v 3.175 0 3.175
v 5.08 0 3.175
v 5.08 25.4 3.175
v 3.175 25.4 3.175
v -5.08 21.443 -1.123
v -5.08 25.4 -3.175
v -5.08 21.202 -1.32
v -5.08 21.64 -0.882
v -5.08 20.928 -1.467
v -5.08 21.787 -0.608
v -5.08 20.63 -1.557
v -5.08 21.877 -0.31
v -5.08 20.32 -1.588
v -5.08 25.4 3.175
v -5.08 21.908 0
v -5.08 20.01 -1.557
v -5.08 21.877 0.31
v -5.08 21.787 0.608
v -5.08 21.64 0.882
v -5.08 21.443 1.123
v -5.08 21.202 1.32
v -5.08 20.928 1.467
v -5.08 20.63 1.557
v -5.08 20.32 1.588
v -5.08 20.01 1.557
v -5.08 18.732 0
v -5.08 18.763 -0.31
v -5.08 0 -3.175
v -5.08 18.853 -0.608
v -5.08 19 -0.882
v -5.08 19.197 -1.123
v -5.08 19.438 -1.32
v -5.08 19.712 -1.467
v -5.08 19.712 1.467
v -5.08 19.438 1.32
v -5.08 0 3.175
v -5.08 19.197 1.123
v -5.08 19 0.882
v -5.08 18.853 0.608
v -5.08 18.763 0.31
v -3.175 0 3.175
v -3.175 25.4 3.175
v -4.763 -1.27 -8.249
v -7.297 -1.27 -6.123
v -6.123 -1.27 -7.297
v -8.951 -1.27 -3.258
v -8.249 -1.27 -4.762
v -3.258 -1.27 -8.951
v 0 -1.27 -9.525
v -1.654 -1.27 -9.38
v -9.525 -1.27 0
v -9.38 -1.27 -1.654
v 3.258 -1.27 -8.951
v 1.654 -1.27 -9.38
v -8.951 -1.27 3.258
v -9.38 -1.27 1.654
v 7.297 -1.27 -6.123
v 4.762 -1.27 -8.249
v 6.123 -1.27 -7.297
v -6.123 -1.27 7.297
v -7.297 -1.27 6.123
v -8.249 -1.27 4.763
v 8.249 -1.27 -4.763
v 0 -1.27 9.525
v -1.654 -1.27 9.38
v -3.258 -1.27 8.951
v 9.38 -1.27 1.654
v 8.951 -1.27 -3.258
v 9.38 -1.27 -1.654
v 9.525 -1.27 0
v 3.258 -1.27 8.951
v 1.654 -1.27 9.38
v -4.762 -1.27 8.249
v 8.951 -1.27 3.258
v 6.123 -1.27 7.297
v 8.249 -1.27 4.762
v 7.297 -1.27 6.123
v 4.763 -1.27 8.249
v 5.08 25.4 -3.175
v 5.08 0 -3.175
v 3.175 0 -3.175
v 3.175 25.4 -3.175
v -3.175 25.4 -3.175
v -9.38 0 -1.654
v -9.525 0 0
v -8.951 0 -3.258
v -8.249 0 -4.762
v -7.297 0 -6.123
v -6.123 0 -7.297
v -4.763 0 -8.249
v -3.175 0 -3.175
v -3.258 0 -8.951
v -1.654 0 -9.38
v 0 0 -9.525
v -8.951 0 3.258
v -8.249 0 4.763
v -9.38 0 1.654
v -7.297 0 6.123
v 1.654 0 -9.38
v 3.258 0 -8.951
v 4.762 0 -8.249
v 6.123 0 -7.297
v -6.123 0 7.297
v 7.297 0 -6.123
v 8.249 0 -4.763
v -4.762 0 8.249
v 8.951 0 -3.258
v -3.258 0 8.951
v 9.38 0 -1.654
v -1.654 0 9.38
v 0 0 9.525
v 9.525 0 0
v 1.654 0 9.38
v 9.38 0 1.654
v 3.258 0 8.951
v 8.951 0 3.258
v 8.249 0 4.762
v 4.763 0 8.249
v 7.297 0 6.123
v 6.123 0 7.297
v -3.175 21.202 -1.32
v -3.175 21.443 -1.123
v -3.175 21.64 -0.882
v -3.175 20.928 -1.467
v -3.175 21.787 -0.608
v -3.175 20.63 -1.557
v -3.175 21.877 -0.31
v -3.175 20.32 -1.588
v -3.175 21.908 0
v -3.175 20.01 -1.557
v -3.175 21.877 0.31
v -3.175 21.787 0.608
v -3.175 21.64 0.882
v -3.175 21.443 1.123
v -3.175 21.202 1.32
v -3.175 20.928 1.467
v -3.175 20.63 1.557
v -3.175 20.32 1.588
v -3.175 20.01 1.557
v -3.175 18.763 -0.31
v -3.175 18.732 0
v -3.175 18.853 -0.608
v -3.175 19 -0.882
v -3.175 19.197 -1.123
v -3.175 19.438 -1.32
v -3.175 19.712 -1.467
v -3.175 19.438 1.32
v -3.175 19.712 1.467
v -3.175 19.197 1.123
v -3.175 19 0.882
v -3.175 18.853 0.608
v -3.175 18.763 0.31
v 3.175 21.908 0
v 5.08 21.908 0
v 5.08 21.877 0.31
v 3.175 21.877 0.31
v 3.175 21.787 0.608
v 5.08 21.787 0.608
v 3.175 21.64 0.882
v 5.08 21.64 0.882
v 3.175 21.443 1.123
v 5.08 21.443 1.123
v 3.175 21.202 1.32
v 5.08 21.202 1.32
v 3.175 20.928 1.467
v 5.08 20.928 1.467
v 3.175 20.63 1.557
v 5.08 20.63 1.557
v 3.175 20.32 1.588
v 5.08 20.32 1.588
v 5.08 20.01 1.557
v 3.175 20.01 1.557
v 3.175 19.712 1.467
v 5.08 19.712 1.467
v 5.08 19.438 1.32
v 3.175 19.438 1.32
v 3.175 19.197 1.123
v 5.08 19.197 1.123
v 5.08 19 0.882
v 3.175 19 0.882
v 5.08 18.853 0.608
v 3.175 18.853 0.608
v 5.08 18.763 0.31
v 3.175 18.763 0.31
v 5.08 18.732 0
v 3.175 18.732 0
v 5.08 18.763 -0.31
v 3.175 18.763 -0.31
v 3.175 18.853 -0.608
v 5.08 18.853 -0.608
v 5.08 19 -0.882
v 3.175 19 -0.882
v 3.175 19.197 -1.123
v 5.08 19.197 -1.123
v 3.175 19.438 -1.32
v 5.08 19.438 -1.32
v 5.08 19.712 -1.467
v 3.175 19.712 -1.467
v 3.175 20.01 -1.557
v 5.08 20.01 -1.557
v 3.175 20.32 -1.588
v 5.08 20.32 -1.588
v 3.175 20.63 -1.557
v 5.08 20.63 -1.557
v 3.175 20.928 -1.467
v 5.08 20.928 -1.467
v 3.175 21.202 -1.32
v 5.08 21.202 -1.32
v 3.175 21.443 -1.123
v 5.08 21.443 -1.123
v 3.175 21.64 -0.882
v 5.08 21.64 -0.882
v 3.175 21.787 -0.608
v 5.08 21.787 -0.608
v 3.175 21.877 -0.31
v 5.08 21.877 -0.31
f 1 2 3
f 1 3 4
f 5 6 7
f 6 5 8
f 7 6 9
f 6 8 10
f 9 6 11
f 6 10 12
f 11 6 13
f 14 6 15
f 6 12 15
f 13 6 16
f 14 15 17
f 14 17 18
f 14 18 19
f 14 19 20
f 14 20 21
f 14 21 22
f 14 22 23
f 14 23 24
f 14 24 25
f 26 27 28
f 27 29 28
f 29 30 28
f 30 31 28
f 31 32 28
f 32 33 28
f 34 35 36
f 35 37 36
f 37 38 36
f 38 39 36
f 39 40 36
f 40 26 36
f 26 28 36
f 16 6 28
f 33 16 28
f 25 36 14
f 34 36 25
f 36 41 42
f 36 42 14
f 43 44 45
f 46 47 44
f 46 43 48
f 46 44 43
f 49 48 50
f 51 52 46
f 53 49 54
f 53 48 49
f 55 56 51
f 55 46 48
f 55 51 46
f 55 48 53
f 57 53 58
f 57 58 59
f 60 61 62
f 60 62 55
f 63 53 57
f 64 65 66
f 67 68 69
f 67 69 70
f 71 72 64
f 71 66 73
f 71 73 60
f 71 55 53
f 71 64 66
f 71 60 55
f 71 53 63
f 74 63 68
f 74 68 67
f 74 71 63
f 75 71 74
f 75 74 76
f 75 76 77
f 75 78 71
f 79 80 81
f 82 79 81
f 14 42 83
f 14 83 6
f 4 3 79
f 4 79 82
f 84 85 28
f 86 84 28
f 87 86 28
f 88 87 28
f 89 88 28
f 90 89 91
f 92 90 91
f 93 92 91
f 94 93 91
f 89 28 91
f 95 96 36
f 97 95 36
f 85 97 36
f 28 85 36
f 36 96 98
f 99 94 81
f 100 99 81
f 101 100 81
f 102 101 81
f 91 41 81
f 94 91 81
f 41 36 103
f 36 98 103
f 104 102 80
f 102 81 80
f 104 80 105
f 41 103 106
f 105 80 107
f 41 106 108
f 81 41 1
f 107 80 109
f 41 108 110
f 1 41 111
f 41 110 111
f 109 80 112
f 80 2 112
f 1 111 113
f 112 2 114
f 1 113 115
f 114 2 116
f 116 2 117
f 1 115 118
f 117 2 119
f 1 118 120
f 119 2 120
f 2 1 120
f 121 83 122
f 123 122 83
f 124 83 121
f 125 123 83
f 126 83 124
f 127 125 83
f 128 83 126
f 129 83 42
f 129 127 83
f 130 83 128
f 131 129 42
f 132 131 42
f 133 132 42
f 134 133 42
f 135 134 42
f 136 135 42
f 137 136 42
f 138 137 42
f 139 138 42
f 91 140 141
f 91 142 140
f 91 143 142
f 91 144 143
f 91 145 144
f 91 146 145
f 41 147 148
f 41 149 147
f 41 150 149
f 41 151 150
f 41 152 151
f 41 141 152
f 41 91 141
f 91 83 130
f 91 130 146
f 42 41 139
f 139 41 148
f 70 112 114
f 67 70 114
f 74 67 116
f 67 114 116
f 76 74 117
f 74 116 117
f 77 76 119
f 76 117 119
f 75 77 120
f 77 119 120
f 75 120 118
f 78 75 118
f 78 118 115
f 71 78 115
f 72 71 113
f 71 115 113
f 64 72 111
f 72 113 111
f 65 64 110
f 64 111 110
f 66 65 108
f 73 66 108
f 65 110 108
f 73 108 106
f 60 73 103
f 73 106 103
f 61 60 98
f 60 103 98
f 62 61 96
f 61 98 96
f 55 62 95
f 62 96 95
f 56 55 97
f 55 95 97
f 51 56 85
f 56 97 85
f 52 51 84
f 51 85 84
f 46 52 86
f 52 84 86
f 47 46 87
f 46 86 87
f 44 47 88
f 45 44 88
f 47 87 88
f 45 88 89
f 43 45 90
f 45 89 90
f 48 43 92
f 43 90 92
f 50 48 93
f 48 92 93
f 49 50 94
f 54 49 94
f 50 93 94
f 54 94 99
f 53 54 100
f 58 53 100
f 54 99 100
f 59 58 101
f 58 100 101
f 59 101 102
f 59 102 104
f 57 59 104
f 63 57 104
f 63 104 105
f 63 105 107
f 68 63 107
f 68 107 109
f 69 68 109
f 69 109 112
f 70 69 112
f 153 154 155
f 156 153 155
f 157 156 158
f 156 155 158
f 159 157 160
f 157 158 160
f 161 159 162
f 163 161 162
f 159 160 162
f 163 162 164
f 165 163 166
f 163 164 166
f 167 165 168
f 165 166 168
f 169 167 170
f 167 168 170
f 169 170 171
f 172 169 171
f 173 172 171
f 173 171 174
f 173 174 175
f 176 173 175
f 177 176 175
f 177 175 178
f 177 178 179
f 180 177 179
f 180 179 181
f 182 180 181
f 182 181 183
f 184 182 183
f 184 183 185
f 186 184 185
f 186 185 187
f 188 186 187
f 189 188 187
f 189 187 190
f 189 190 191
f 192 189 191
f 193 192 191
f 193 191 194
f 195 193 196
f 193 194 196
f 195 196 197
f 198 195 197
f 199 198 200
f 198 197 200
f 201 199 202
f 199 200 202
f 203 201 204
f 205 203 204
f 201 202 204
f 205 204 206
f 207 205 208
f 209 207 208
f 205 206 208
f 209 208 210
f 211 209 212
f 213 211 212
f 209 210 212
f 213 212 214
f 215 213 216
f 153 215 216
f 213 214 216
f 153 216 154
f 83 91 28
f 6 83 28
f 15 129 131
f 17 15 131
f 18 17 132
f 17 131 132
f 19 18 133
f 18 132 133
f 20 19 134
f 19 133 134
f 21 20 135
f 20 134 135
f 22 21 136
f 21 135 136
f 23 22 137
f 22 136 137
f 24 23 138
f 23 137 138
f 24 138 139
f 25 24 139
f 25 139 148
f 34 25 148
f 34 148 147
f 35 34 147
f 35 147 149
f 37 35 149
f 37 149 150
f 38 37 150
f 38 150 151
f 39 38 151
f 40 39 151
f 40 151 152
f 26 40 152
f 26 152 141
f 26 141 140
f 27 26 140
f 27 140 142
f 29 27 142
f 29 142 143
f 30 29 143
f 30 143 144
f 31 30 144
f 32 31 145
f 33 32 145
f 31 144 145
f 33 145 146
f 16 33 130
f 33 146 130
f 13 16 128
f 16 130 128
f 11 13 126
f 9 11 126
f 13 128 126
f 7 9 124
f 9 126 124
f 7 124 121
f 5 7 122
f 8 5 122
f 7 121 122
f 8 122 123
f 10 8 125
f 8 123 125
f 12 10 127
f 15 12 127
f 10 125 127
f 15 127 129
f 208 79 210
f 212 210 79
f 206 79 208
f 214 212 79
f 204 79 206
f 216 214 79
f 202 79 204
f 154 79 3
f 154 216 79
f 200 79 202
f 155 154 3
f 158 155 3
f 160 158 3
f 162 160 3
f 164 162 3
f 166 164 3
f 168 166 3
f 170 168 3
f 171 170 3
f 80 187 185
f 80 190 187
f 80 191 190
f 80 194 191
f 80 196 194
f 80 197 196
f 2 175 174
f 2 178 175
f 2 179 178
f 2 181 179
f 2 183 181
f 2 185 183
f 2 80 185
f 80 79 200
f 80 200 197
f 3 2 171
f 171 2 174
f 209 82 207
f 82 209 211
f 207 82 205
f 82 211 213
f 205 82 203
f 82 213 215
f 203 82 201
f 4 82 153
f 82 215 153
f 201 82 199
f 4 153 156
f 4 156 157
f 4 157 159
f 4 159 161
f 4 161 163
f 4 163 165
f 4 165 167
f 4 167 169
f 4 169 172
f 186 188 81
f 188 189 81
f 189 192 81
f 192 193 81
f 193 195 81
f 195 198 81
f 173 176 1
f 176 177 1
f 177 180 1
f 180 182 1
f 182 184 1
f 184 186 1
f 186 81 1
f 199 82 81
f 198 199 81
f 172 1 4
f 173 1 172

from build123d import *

# Parameters (mm, degrees)
F0_R     = 9.525
F1_DEPTH = 1.27
F2_W     = 1.905
F2_H     = 6.35
F3_DEPTH = 25.4
F4_R     = 1.5875
F5_DEPTH = 14.606


with BuildPart() as f1:
    # F0 (on Front) → F1 (new body)
    with BuildSketch(Plane.XZ):
        Circle(F0_R)
    extrude(amount=F1_DEPTH)

    # F2 (on face) → F3 (join)
    with BuildSketch(Plane(origin=(0, 0, 0), x_dir=(-1, 0, 0), z_dir=(0, 1, 0))):
        with Locations((-4.1275, 0)):
            Rectangle(F2_W, F2_H)
        with Locations((4.1275, 0)):
            Rectangle(F2_W, F2_H)
    extrude(amount=F3_DEPTH)

    # F4 (on face) → F5 (cut, through all)
    with BuildSketch(Plane.YZ.offset(5.08)):
        with Locations((20.32, 0)):
            Circle(F4_R)
    extrude(amount=-F5_DEPTH, mode=Mode.SUBTRACT)


solid = f1.part
